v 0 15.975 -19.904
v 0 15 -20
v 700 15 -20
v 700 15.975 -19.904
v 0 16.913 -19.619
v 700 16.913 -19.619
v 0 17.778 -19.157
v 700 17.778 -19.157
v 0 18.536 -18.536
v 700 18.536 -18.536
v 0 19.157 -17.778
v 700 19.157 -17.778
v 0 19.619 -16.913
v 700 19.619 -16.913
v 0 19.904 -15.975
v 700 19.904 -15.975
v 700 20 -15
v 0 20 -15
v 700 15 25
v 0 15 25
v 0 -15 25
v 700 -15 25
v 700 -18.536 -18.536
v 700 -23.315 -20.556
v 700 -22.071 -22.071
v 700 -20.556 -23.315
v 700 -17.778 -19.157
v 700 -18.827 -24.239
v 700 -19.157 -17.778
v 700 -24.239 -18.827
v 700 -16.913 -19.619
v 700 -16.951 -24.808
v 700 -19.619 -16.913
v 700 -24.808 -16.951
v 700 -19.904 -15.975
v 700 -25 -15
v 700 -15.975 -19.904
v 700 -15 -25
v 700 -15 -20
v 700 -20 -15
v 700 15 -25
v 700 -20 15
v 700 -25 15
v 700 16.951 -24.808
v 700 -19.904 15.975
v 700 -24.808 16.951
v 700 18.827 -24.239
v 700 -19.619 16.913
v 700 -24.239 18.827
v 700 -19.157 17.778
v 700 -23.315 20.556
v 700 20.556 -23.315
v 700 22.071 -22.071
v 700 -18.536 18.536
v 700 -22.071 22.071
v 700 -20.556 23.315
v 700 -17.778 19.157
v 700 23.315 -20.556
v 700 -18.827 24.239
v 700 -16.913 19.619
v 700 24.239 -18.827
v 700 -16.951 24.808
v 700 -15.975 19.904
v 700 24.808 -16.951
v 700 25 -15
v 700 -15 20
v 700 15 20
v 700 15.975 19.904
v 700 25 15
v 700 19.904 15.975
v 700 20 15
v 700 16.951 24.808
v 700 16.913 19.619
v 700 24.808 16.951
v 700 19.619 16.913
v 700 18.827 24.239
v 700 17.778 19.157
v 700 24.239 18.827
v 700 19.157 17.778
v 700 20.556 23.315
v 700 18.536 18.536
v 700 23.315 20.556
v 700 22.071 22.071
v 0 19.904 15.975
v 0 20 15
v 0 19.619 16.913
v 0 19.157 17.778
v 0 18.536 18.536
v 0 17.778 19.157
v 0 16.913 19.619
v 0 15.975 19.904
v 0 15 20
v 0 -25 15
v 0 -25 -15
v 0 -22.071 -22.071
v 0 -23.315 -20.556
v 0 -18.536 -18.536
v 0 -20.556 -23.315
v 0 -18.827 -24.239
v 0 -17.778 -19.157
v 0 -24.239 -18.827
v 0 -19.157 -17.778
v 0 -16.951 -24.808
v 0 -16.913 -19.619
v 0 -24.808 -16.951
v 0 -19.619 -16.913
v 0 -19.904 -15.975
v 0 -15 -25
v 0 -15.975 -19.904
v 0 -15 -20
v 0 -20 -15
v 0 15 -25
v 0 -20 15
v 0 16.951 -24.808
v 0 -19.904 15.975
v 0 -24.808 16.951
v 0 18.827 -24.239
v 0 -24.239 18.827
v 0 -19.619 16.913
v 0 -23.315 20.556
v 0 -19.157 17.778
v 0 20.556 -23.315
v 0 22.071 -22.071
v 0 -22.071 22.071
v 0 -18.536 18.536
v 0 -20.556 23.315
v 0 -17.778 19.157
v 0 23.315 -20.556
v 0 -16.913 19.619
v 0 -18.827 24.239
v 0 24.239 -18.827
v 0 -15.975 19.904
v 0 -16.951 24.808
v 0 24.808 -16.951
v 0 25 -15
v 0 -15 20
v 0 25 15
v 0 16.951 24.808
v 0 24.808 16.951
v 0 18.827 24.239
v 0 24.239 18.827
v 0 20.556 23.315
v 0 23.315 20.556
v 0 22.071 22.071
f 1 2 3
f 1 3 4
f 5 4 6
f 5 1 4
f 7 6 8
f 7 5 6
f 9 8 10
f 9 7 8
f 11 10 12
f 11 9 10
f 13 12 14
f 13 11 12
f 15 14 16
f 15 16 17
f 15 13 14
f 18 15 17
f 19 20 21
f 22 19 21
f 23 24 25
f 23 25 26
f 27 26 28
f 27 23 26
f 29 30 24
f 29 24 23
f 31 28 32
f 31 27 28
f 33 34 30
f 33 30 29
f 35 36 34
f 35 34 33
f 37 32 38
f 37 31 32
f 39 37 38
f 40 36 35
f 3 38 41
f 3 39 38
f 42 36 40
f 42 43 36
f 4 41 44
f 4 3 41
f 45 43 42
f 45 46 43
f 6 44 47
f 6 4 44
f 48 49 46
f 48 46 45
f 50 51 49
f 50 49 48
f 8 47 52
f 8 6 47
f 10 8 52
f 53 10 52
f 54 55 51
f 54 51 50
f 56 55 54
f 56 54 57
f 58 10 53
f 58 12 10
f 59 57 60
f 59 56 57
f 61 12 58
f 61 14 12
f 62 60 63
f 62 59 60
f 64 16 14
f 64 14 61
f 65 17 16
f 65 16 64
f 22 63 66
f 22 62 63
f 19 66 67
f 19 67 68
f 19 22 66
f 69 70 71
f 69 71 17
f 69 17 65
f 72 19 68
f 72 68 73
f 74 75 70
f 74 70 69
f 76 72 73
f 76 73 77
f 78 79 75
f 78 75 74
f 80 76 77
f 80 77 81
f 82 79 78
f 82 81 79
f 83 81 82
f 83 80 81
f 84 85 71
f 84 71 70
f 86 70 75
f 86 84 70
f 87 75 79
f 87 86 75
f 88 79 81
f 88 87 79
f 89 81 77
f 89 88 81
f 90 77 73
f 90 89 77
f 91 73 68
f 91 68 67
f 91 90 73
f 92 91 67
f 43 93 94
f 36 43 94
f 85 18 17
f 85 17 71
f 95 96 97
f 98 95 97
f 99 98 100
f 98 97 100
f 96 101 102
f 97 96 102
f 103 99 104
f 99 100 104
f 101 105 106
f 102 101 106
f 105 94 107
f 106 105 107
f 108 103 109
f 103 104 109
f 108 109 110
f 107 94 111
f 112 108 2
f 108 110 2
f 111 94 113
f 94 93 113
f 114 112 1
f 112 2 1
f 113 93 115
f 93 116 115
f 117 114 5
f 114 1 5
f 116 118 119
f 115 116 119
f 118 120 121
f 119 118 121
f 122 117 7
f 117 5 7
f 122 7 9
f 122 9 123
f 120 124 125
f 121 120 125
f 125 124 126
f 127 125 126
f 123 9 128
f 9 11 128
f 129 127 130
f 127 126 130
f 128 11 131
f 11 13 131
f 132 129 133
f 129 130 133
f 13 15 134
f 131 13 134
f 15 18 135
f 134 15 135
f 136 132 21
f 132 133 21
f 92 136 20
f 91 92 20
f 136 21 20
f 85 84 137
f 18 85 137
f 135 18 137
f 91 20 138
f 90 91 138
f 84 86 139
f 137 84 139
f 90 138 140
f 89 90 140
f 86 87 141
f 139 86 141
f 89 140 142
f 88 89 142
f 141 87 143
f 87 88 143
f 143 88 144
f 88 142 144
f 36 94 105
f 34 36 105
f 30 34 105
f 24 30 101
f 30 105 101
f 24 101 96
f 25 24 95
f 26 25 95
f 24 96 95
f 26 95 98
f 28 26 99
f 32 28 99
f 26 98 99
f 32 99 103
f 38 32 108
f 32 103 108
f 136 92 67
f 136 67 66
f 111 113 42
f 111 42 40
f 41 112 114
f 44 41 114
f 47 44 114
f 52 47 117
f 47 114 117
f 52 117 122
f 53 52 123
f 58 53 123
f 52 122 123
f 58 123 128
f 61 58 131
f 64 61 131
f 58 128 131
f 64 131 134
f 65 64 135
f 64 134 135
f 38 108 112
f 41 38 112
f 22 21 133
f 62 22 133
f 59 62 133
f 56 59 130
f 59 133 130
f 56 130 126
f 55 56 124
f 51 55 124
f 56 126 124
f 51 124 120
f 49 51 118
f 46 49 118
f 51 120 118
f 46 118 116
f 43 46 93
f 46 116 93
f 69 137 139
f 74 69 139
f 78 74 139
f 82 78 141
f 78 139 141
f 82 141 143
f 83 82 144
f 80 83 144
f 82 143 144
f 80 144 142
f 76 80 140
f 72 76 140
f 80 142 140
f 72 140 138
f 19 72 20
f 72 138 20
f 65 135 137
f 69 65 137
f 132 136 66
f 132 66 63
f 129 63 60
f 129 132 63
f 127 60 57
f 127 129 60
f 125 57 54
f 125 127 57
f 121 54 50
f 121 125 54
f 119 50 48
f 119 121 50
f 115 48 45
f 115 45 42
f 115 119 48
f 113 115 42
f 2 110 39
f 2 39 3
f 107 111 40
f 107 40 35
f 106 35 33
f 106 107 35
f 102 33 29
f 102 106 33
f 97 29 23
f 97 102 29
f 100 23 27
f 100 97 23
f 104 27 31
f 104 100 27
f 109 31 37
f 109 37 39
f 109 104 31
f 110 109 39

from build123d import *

# Parameters (mm, degrees)
TUBE_SQUARE_RHS50X50X5_1_DEPTH = 700


with BuildPart() as part:
    # Sketch1 → Tube (square) RHS50X50X5(1) (new body)
    with BuildSketch(Plane.YZ):
        with BuildLine():
            Line((-15, -25), (15, -25))
            ThreePointArc((15, -25), (22.071067812, -22.071067812), (25, -15))
            Line((25, -15), (25, 15))
            ThreePointArc((25, 15), (22.071067812, 22.071067812), (15, 25))
            Line((15, 25), (-15, 25))
            ThreePointArc((-15, 25), (-22.071067812, 22.071067812), (-25, 15))
            Line((-25, 15), (-25, -15))
            ThreePointArc((-25, -15), (-22.071067812, -22.071067812), (-15, -25))
        make_face()
        with BuildLine():
            Line((-15, -20), (15, -20))
            ThreePointArc((15, -20), (18.535533906, -18.535533906), (20, -15))
            Line((20, -15), (20, 15))
            ThreePointArc((20, 15), (18.535533906, 18.535533906), (15, 20))
            Line((15, 20), (-15, 20))
            ThreePointArc((-15, 20), (-18.535533906, 18.535533906), (-20, 15))
            Line((-20, 15), (-20, -15))
            ThreePointArc((-20, -15), (-18.535533906, -18.535533906), (-15, -20))
        make_face(mode=Mode.SUBTRACT)
    extrude(amount=TUBE_SQUARE_RHS50X50X5_1_DEPTH)


solid = part.part
